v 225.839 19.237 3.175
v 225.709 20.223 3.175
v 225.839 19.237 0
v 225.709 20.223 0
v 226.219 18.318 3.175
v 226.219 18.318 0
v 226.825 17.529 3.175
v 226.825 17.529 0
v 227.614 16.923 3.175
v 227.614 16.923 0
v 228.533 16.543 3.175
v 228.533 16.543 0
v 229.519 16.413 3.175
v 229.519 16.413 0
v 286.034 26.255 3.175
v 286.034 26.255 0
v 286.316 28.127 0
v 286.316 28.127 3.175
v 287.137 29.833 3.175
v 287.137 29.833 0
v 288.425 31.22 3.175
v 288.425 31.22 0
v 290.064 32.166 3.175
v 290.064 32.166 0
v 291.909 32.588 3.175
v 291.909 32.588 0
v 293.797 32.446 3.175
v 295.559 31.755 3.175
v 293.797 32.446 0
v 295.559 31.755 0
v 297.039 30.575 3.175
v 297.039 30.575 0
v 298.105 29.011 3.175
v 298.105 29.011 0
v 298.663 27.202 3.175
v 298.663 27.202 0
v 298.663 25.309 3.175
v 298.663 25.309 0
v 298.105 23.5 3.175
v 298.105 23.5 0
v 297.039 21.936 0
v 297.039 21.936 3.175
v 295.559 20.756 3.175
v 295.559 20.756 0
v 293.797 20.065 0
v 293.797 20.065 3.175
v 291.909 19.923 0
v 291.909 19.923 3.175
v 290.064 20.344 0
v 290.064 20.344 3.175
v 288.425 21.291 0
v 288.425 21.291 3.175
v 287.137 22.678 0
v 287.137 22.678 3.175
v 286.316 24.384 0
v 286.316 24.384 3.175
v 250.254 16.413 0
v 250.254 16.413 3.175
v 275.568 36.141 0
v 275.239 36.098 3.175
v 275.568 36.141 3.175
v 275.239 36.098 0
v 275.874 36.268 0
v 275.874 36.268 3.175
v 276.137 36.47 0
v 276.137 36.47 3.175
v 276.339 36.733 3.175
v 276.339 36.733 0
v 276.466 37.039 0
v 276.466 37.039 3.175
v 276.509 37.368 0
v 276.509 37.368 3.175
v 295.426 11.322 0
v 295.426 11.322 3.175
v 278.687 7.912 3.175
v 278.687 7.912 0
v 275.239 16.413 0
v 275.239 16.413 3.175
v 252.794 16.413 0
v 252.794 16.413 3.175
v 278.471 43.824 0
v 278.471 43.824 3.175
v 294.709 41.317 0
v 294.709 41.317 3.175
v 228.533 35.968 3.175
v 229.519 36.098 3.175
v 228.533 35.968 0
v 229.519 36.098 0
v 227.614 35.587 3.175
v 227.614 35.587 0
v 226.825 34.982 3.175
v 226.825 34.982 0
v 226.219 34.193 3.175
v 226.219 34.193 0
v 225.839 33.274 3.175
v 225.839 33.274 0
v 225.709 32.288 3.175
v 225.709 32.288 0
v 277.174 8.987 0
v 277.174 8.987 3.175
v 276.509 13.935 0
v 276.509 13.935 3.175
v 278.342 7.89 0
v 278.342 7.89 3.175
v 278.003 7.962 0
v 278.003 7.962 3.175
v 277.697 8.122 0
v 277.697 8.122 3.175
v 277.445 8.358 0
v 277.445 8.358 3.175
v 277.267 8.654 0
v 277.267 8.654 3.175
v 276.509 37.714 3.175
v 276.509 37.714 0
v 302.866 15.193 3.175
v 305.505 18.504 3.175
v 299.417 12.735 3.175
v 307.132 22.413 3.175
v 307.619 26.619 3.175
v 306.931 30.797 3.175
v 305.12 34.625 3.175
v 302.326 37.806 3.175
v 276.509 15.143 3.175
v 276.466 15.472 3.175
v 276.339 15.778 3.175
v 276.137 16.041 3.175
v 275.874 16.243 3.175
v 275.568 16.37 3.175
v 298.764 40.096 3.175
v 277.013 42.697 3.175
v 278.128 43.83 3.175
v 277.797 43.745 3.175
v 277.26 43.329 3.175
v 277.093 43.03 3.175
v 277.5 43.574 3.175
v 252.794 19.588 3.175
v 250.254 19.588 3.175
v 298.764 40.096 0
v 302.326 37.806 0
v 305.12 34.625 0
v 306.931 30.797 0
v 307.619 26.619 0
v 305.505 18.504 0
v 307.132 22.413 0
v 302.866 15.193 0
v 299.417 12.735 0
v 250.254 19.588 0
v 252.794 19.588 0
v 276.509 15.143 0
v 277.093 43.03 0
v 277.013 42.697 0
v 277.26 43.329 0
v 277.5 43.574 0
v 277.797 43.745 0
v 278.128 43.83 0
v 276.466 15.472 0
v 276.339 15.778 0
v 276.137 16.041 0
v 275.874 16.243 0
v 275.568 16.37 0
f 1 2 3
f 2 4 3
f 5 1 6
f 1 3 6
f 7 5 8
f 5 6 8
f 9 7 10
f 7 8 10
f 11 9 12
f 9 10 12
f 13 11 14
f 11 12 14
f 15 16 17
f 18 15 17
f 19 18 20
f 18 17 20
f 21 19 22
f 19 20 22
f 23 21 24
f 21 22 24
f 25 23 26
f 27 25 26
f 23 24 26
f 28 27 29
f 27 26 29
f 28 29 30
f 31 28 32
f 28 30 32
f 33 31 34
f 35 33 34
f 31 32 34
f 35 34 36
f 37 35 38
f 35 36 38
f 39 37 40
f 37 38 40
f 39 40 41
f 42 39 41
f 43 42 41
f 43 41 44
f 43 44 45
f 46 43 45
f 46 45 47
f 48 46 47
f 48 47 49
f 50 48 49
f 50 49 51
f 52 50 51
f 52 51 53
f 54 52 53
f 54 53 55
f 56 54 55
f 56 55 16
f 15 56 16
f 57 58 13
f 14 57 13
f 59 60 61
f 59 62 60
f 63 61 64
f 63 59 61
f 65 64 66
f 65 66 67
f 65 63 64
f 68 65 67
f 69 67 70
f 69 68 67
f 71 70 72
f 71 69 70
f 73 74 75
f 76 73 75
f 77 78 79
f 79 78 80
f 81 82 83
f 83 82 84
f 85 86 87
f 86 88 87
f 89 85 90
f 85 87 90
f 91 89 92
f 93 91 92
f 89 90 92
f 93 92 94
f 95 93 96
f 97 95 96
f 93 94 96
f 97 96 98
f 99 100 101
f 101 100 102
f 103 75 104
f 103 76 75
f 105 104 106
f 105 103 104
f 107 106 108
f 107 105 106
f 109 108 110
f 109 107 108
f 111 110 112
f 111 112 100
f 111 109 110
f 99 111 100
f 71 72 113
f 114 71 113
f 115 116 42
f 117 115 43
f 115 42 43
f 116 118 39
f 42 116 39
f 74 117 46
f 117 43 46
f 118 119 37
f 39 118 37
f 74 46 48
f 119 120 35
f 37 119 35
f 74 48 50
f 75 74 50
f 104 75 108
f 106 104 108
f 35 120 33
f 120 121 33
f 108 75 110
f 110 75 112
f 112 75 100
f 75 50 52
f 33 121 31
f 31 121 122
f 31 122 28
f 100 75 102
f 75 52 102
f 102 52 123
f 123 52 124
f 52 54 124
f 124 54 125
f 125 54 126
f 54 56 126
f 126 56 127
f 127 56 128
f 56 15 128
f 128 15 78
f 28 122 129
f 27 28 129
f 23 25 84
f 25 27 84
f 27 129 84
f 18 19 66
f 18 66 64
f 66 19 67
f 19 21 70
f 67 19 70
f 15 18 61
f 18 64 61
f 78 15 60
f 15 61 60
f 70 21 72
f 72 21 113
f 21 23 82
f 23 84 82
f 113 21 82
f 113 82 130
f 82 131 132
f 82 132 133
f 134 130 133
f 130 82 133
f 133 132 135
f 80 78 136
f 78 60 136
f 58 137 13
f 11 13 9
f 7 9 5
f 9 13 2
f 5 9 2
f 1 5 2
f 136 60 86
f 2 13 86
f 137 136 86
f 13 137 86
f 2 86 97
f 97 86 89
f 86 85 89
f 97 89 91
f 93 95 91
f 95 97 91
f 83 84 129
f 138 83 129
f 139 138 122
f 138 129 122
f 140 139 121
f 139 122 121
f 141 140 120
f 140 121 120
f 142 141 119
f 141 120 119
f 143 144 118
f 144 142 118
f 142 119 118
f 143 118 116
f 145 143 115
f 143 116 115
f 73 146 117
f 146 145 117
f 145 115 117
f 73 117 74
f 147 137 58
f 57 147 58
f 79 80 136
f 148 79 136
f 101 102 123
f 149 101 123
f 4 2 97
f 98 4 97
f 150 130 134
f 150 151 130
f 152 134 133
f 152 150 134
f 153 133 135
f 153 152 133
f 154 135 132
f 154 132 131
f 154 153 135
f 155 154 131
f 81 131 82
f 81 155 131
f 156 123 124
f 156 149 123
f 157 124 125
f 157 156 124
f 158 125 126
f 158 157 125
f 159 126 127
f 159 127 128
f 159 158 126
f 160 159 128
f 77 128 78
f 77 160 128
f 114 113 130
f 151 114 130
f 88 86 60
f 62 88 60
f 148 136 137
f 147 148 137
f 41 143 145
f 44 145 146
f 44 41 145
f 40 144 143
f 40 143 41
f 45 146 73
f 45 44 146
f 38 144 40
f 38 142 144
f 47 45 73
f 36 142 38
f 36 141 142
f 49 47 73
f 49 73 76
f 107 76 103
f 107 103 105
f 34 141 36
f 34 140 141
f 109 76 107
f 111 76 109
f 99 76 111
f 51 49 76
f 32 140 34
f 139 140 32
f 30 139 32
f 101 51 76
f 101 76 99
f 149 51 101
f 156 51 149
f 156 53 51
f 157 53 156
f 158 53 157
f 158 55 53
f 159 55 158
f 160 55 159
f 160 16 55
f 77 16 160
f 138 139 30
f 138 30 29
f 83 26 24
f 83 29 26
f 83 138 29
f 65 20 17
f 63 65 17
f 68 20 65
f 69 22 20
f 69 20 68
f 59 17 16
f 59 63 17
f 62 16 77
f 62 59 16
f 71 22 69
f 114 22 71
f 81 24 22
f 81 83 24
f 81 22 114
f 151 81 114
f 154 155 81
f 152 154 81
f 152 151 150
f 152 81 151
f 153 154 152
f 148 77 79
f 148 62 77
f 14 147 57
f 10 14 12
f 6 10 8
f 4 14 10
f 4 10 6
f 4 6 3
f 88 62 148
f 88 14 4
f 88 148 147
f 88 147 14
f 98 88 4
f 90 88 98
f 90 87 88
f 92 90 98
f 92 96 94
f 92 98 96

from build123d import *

# Parameters (mm, degrees)
BOSS_EXTRUDE1_DEPTH = 3.175
CUT_EXTRUDE1_DEPTH  = 7.62
SKETCH3_R           = 6.35
CUT_EXTRUDE2_DEPTH  = 7.62
CUT_EXTRUDE3_DEPTH  = 443.627115857
FILLET1_R           = 3.81
FILLET2_R           = 1.27


with BuildPart() as part:
    # Sketch1 → Boss-Extrude1 (new body)
    with BuildSketch(Plane.XY):
        with BuildLine():
            Line((435.33010469, 0.678691456), (439.172882547, -1.614212492))
            Line((439.172882547, -1.614212492), (434.787151486, -0.678691456))
            add(Edge.make_bspline(
                [(0, 0), (0.11179123, -0.527729161), (0.335887463, -1.58561283), (0.94472768, -3.108527015), (1.749889805, -4.572488672), (2.768272335, -5.973609192), (3.993104005, -7.311505618), (5.421679636, -8.587569541), (7.052598221, -9.801114861), (8.883725224, -10.951589231), (10.912400596, -12.040213999), (13.136344152, -13.066312264), (15.553528081, -14.029563428), (18.161318821, -14.928679795), (20.956528242, -15.765030781), (23.936498821, -16.536578215), (27.097842034, -17.244400464), (30.437517266, -17.886690773), (33.951885298, -18.464101669), (37.637295209, -18.976309975), (41.489964184, -19.423636044), (45.506112459, -19.80514129), (49.681767661, -20.121646285), (54.012767863, -20.373360955), (58.494909036, -20.561083494), (63.123897762, -20.684100336), (67.895200479, -20.744329207), (72.804505265, -20.742674403), (77.847009648, -20.678693244), (83.018406129, -20.555920262), (88.313732191, -20.373577887), (93.728207214, -20.133872554), (99.256947275, -19.839216685), (104.89499369, -19.49060908), (110.637384794, -19.089594814), (116.479134607, -18.639389777), (122.414936441, -18.141116951), (128.439613477, -17.597680601), (134.547832047, -17.011801372), (140.734314746, -16.385333349), (146.993600903, -15.721223571), (153.320115485, -15.021624036), (159.708476563, -14.290267097), (166.152848405, -13.528475979), (172.647781594, -12.740600204), (179.187166024, -11.928145018), (185.765533466, -11.094239816), (192.376967293, -10.242811017), (199.015278084, -9.37376151), (205.674882543, -8.493282903), (212.349358377, -7.600650086), (219.032895906, -6.7004538), (225.719308248, -5.795492203), (232.402082768, -4.886043807), (239.075345122, -3.975877517), (245.732904616, -3.06749205), (252.368240069, -2.160970285), (258.975348295, -1.26081803), (265.547576185, -0.366925322), (272.078863439, 0.518895586), (278.562951189, 1.394000598), (284.993721977, 2.257285217), (291.364542133, 3.108203268), (297.66900214, 3.947074317), (303.806375969, 4.748436439), (309.760626579, 5.554962658), (315.551818652, 6.216135275), (321.27090305, 6.780469964), (326.923820465, 7.243146515), (332.503782957, 7.610821489), (338.004397185, 7.886122043), (343.419107553, 8.072891719), (348.74107448, 8.176671364), (353.963650696, 8.200094537), (359.079707468, 8.150631139), (364.082590991, 8.032268225), (368.965318868, 7.850318702), (373.721079318, 7.610921079), (378.343117125, 7.320601554), (382.824493294, 6.983642622), (387.158963185, 6.607910686), (391.339839301, 6.198906082), (395.360701925, 5.761301701), (399.215684034, 5.304267166), (402.898615263, 4.830811549), (406.403955911, 4.348715399), (409.726063296, 3.862864382), (412.859676284, 3.379461168), (415.799871302, 2.903117573), (418.541899149, 2.440155772), (421.081464376, 1.994901374), (423.414160264, 1.571702591), (425.536750687, 1.175899009), (427.445043551, 0.809456817), (429.136486586, 0.478415007), (430.607934716, 0.184234372), (431.857230885, -0.068940506), (432.88219343, -0.280110359), (433.681265576, -0.445808771), (434.252869013, -0.566300363), (434.596385478, -0.637999126), (434.749014267, -0.670556399), (434.787151486, -0.678691456)],
                knots=[0, 0, 0, 0, 0.003638255, 0.007293231, 0.011028136, 0.014901081, 0.018963272, 0.023258475, 0.027820626, 0.032679082, 0.03785316, 0.043361875, 0.049214679, 0.055422346, 0.061988786, 0.068918036, 0.076211157, 0.083868392, 0.091887411, 0.100265912, 0.108999867, 0.118084529, 0.127514843, 0.13728527, 0.147387917, 0.157816481, 0.168563473, 0.179619128, 0.190977373, 0.202626974, 0.214560478, 0.226767249, 0.239236417, 0.251959004, 0.264923894, 0.278119703, 0.291536035, 0.30516028, 0.318980685, 0.332985499, 0.34716279, 0.361498603, 0.375980747, 0.390597192, 0.405332593, 0.420174823, 0.435109533, 0.450124276, 0.465203068, 0.480333154, 0.495500583, 0.510689775, 0.525887334, 0.541078314, 0.556247233, 0.571381785, 0.58646604, 0.601484515, 0.616424329, 0.631269423, 0.646006524, 0.660620684, 0.675098187, 0.689422858, 0.703581825, 0.716907563, 0.730009274, 0.742952128, 0.755725557, 0.768319951, 0.780724337, 0.792926528, 0.804916041, 0.816679084, 0.828203525, 0.8394749, 0.850481359, 0.861207697, 0.871639326, 0.881763414, 0.891563605, 0.901027365, 0.910138977, 0.918883977, 0.927249278, 0.935221104, 0.942784739, 0.949928188, 0.956638465, 0.962904203, 0.968712288, 0.974054485, 0.978918432, 0.983297219, 0.987180246, 0.990560674, 0.993433357, 0.995790626, 0.997629588, 0.998945816, 0.999736592, 1, 1, 1, 1], degree=3))
            add(Edge.make_bspline(
                [(435.33010469, 0.678691456), (435.296755582, 0.699293055), (435.163488681, 0.781619431), (434.863214309, 0.965803828), (434.363194901, 1.272571896), (433.663211466, 1.69979322), (432.763807452, 2.246333125), (431.664530435, 2.908364558), (430.366066728, 3.683736897), (428.86873043, 4.568782589), (427.172675107, 5.559358025), (425.278546429, 6.651449737), (423.186509465, 7.838875427), (420.897374442, 9.116782681), (418.411926851, 10.4790944), (415.730636684, 11.919657082), (412.854464224, 13.43114364), (409.784513475, 15.00705265), (406.521344218, 16.638681918), (403.066494801, 18.319240705), (399.421116368, 20.040349747), (395.586453278, 21.79282696), (391.56470833, 23.569527811), (387.356993489, 25.359407096), (382.965706604, 27.15470981), (378.392717175, 28.945218407), (373.640732922, 30.722778715), (368.711587102, 32.475875028), (363.608964359, 34.196846251), (358.335340013, 35.87451254), (352.894485425, 37.499762392), (347.289561815, 39.062058655), (341.52524157, 40.553388886), (335.605180365, 41.962892679), (329.534395845, 43.28113527), (323.317713598, 44.500180123), (316.960347344, 45.607856696), (310.479914041, 46.603301327), (303.980682286, 47.431342852), (297.494822244, 48.243461645), (291.0186212, 49.006373108), (284.46326746, 49.736966294), (277.835067652, 50.431127833), (271.140596349, 51.086687253), (264.386630807, 51.700815013), (257.580189535, 52.27171033), (250.727858804, 52.796138155), (243.836864005, 53.273290553), (236.914017847, 53.698972807), (229.966694004, 54.072865307), (223.001944897, 54.392360355), (216.027018499, 54.655256617), (209.049321182, 54.859966995), (202.076096041, 55.004530305), (195.114893299, 55.088037667), (188.172953688, 55.108207309), (181.257823923, 55.064678381), (174.376745271, 54.95595632), (167.537272154, 54.780552763), (160.7466557, 54.538140281), (154.012238926, 54.228824112), (147.341395315, 53.850013849), (140.741361553, 53.404123644), (134.219487317, 52.889280335), (127.782938298, 52.305347044), (121.438460058, 51.65475786), (115.193116172, 50.935743156), (109.053599754, 50.150348891), (103.026626206, 49.300114834), (97.118957953, 48.384577869), (91.33692342, 47.406382542), (85.686763085, 46.366529581), (80.174454785, 45.268067638), (74.805999973, 44.111283189), (69.587081438, 42.899646299), (64.52312301, 41.635267927), (59.619568317, 40.320462769), (54.881388132, 38.958385816), (50.313373811, 37.552127128), (45.920850559, 36.103231966), (41.707138151, 34.617193881), (37.677412709, 33.095067788), (33.834761135, 31.541542875), (30.183686712, 29.958740393), (26.726916941, 28.351485511), (23.468364091, 26.721608068), (20.41035055, 25.073674406), (17.555946308, 23.410211446), (14.907899047, 21.73430892), (12.467321746, 20.050217809), (10.237579271, 18.35899521), (8.219437586, 16.664914738), (6.414173801, 14.97055608), (4.824368385, 13.277086383), (3.449964137, 11.587487839), (2.292762263, 9.903098559), (1.352963468, 8.225512409), (0.632693499, 6.555947979), (0.13123808, 4.895344207), (-0.143255259, 3.246152095), (-0.211578297, 1.607049514), (-0.07042072, 0.534882766), (0, 0)],
                knots=[0, 0, 0, 0, 0.00025409, 0.001015373, 0.002283359, 0.004056577, 0.006330982, 0.009105274, 0.012374489, 0.016134023, 0.02037966, 0.025105976, 0.030306237, 0.035972206, 0.042099522, 0.048678064, 0.055701664, 0.063160184, 0.071045824, 0.079349826, 0.08806291, 0.097175756, 0.106678112, 0.116561573, 0.126814275, 0.137428301, 0.148393618, 0.15969976, 0.171338126, 0.183297699, 0.195569604, 0.208143556, 0.221011593, 0.234161831, 0.24758745, 0.261276822, 0.27522271, 0.289414144, 0.303771199, 0.317689227, 0.331784111, 0.346039677, 0.36044387, 0.37498272, 0.389640454, 0.404403316, 0.419256601, 0.434186749, 0.449177265, 0.464214782, 0.479284009, 0.49436974, 0.509457833, 0.524532346, 0.53957932, 0.554582984, 0.569529546, 0.584403417, 0.599190992, 0.613876838, 0.628447475, 0.642888675, 0.657186054, 0.671325546, 0.685294014, 0.699078147, 0.712665095, 0.726042645, 0.739197713, 0.752117586, 0.764792042, 0.777208152, 0.789355685, 0.80122396, 0.812803686, 0.824082909, 0.835054602, 0.845709571, 0.856037853, 0.866033834, 0.875688843, 0.884997719, 0.893953426, 0.902552897, 0.910789386, 0.918660734, 0.926166253, 0.933302626, 0.94007122, 0.94647478, 0.952517526, 0.958204819, 0.963546652, 0.9685566, 0.973249913, 0.977651041, 0.981787043, 0.985694226, 0.989415109, 0.993001157, 0.996508416, 1, 1, 1, 1], degree=3))
        make_face()
    extrude(amount=BOSS_EXTRUDE1_DEPTH)

    # Sketch2 → Cut-Extrude1 (cut)
    with BuildSketch(Plane(origin=(0, 0, 0), x_dir=(-1, 0, 0), z_dir=(0, 0, -1))):
        Polygon((-252.794440989, 13.221493744), (-250.254440989, 13.221493744), (-250.254440989, -2.115243028), (-250.254440989, -3.986349358), (-252.794440989, -3.050796193), (-252.794440989, -2.115243028), align=None)
        Polygon((-159.131940989, 54.422217902), (-159.131940989, 39.039100326), (-152.781940989, 39.039100326), (-152.781940989, 54.422217902), (-152.781940989, 57.645440557), (-159.131940989, 55.540936844), align=None)
        Polygon((-74.994440989, -5.928775484), (-74.994440989, -20.141805429), (-74.994440989, -20.97642061), (-71.819440989, -22.145862066), (-71.819440989, -20.141805429), (-71.819440989, -5.928775484), align=None)
    extrude(amount=-CUT_EXTRUDE1_DEPTH, mode=Mode.SUBTRACT)

    # Sketch3 → Cut-Extrude2 (cut)
    with BuildSketch(Plane(origin=(0, 0, 0), x_dir=(-1, 0, 0), z_dir=(0, 0, -1))):
        with Locations((-292.383806588, 26.255421435)):
            Circle(SKETCH3_R)
    extrude(amount=-CUT_EXTRUDE2_DEPTH, mode=Mode.SUBTRACT)

    # Sketch4 → Cut-Extrude3 (cut, through all)
    with BuildSketch(Plane.XY.offset(3.175)):
        with BuildLine():
            Line((252.794440989, 13.221493744), (252.794440989, -2.10324862))
            add(Edge.make_bspline(
                [(252.794440989, -2.10324862), (254.858559034, -1.821690299), (259.114187798, -1.241934385), (265.547576185, -0.366925322), (272.078863439, 0.518895586), (278.562951189, 1.394000598), (284.993721977, 2.257285217), (291.364542133, 3.108203268), (297.66900214, 3.947074317), (303.806375969, 4.748436439), (309.760626579, 5.554962658), (315.551818652, 6.216135275), (321.27090305, 6.780469964), (326.923820465, 7.243146515), (332.503782957, 7.610821489), (338.004397185, 7.886122043), (343.419107553, 8.072891719), (348.74107448, 8.176671364), (353.963650696, 8.200094537), (359.079707468, 8.150631139), (364.082590991, 8.032268225), (368.965318868, 7.850318702), (373.721079318, 7.610921079), (378.343117125, 7.320601554), (382.824493294, 6.983642622), (387.158963185, 6.607910686), (391.339839301, 6.198906082), (395.360701925, 5.761301701), (399.215684034, 5.304267166), (402.898615263, 4.830811549), (406.403955911, 4.348715399), (409.726063296, 3.862864382), (412.859676284, 3.379461168), (415.799871302, 2.903117573), (418.541899149, 2.440155772), (421.081464376, 1.994901374), (423.414160264, 1.571702591), (425.536750687, 1.175899009), (427.445043551, 0.809456817), (429.136486586, 0.478415007), (430.607934716, 0.184234372), (431.857230885, -0.068940506), (432.88219343, -0.280110359), (433.681265576, -0.445808771), (434.252869013, -0.566300363), (434.596385478, -0.637999126), (434.749014267, -0.670556399), (434.787151486, -0.678691456)],
                knots=[0.58741252, 0.58741252, 0.58741252, 0.58741252, 0.601484515, 0.616424329, 0.631269423, 0.646006524, 0.660620684, 0.675098187, 0.689422858, 0.703581825, 0.716907563, 0.730009274, 0.742952128, 0.755725557, 0.768319951, 0.780724337, 0.792926528, 0.804916041, 0.816679084, 0.828203525, 0.8394749, 0.850481359, 0.861207697, 0.871639326, 0.881763414, 0.891563605, 0.901027365, 0.910138977, 0.918883977, 0.927249278, 0.935221104, 0.942784739, 0.949928188, 0.956638465, 0.962904203, 0.968712288, 0.974054485, 0.978918432, 0.983297219, 0.987180246, 0.990560674, 0.993433357, 0.995790626, 0.997629588, 0.998945816, 0.999736592, 1, 1, 1, 1], degree=3))
            Line((434.787151486, -0.678691456), (439.172882547, -1.614212492))
            Line((439.172882547, -1.614212492), (435.33010469, 0.678691456))
            add(Edge.make_bspline(
                [(435.33010469, 0.678691456), (435.296755582, 0.699293055), (435.163488681, 0.781619431), (434.863214309, 0.965803828), (434.363194901, 1.272571896), (433.663211466, 1.69979322), (432.763807452, 2.246333125), (431.664530435, 2.908364558), (430.366066728, 3.683736897), (428.86873043, 4.568782589), (427.172675107, 5.559358025), (425.278546429, 6.651449737), (423.186509465, 7.838875427), (420.897374442, 9.116782681), (418.411926851, 10.4790944), (415.730636684, 11.919657082), (412.854464224, 13.43114364), (409.784513475, 15.00705265), (406.521344218, 16.638681918), (403.066494801, 18.319240705), (399.421116368, 20.040349747), (395.586453278, 21.79282696), (391.56470833, 23.569527811), (387.356993489, 25.359407096), (382.965706604, 27.15470981), (378.392717175, 28.945218407), (373.640732922, 30.722778715), (368.711587102, 32.475875028), (363.608964359, 34.196846251), (358.335340013, 35.87451254), (352.894485425, 37.499762392), (347.289561815, 39.062058655), (341.52524157, 40.553388886), (335.605180365, 41.962892679), (329.534395845, 43.28113527), (323.317713598, 44.500180123), (316.960347344, 45.607856696), (310.479914041, 46.603301327), (303.980682286, 47.431342852), (297.494822244, 48.243461645), (291.0186212, 49.006373108), (284.46326746, 49.736966294), (277.835067652, 50.431127833), (271.140596349, 51.086687253), (264.386630807, 51.700815013), (257.580189535, 52.27171033), (250.727858804, 52.796138155), (243.836864005, 53.273290553), (236.914017847, 53.698972807), (229.966694004, 54.072865307), (223.001944897, 54.392360355), (216.027018499, 54.655256617), (209.049321182, 54.859966995), (202.076096041, 55.004530305), (195.114893299, 55.088037667), (188.172953688, 55.108207309), (181.257823923, 55.064678381), (174.376745271, 54.95595632), (167.537272154, 54.780552763), (162.460512229, 54.599321798), (159.664388036, 54.481767761), (159.131940989, 54.458728839)],
                knots=[0, 0, 0, 0, 0.00025409, 0.001015373, 0.002283359, 0.004056577, 0.006330982, 0.009105274, 0.012374489, 0.016134023, 0.02037966, 0.025105976, 0.030306237, 0.035972206, 0.042099522, 0.048678064, 0.055701664, 0.063160184, 0.071045824, 0.079349826, 0.08806291, 0.097175756, 0.106678112, 0.116561573, 0.126814275, 0.137428301, 0.148393618, 0.15969976, 0.171338126, 0.183297699, 0.195569604, 0.208143556, 0.221011593, 0.234161831, 0.24758745, 0.261276822, 0.27522271, 0.289414144, 0.303771199, 0.317689227, 0.331784111, 0.346039677, 0.36044387, 0.37498272, 0.389640454, 0.404403316, 0.419256601, 0.434186749, 0.449177265, 0.464214782, 0.479284009, 0.49436974, 0.509457833, 0.524532346, 0.53957932, 0.554582984, 0.569529546, 0.584403417, 0.599190992, 0.613876838, 0.617331371, 0.617331371, 0.617331371, 0.617331371], degree=3))
            Line((159.131940989, 54.458728839), (159.131940989, 39.039100326))
            Line((159.131940989, 39.039100326), (152.781940989, 39.039100326))
            Line((152.781940989, 39.039100326), (152.781940989, 54.152292604))
            add(Edge.make_bspline(
                [(152.781940989, 54.152292604), (150.960838294, 54.055151294), (146.938096683, 53.822767487), (140.741361553, 53.404123644), (134.219487317, 52.889280335), (127.782938298, 52.305347044), (121.438460058, 51.65475786), (115.193116172, 50.935743156), (109.053599754, 50.150348891), (103.026626206, 49.300114834), (97.118957953, 48.384577869), (91.33692342, 47.406382542), (85.686763085, 46.366529581), (80.174454785, 45.268067638), (74.805999973, 44.111283189), (69.587081438, 42.899646299), (64.52312301, 41.635267927), (59.619568317, 40.320462769), (54.881388132, 38.958385816), (50.313373811, 37.552127128), (45.920850559, 36.103231966), (41.707138151, 34.617193881), (37.677412709, 33.095067788), (33.834761135, 31.541542875), (30.183686712, 29.958740393), (26.726916941, 28.351485511), (23.468364091, 26.721608068), (20.41035055, 25.073674406), (17.555946308, 23.410211446), (14.907899047, 21.73430892), (12.467321746, 20.050217809), (10.237579271, 18.35899521), (8.219437586, 16.664914738), (6.414173801, 14.97055608), (4.824368385, 13.277086383), (3.449964137, 11.587487839), (2.292762263, 9.903098559), (1.352963468, 8.225512409), (0.632693499, 6.555947979), (0.13123808, 4.895344207), (-0.143255259, 3.246152095), (-0.211578297, 1.607049514), (-0.07042072, 0.534882766), (0, 0)],
                knots=[0.631067563, 0.631067563, 0.631067563, 0.631067563, 0.642888675, 0.657186054, 0.671325546, 0.685294014, 0.699078147, 0.712665095, 0.726042645, 0.739197713, 0.752117586, 0.764792042, 0.777208152, 0.789355685, 0.80122396, 0.812803686, 0.824082909, 0.835054602, 0.845709571, 0.856037853, 0.866033834, 0.875688843, 0.884997719, 0.893953426, 0.902552897, 0.910789386, 0.918660734, 0.926166253, 0.933302626, 0.94007122, 0.94647478, 0.952517526, 0.958204819, 0.963546652, 0.9685566, 0.973249913, 0.977651041, 0.981787043, 0.985694226, 0.989415109, 0.993001157, 0.996508416, 1, 1, 1, 1], degree=3))
            add(Edge.make_bspline(
                [(0, 0), (0.11179123, -0.527729161), (0.335887463, -1.58561283), (0.94472768, -3.108527015), (1.749889805, -4.572488672), (2.768272335, -5.973609192), (3.993104005, -7.311505618), (5.421679636, -8.587569541), (7.052598221, -9.801114861), (8.883725224, -10.951589231), (10.912400596, -12.040213999), (13.136344152, -13.066312264), (15.553528081, -14.029563428), (18.161318821, -14.928679795), (20.956528242, -15.765030781), (23.936498821, -16.536578215), (27.097842034, -17.244400464), (30.437517266, -17.886690773), (33.951885298, -18.464101669), (37.637295209, -18.976309975), (41.489964184, -19.423636044), (45.506112459, -19.80514129), (49.681767661, -20.121646285), (54.012767863, -20.373360955), (58.494909036, -20.561083494), (63.123897762, -20.684100336), (67.581814032, -20.740373283), (70.496154942, -20.74305812), (71.819440989, -20.73766124)],
                knots=[0, 0, 0, 0, 0.003638255, 0.007293231, 0.011028136, 0.014901081, 0.018963272, 0.023258475, 0.027820626, 0.032679082, 0.03785316, 0.043361875, 0.049214679, 0.055422346, 0.061988786, 0.068918036, 0.076211157, 0.083868392, 0.091887411, 0.100265912, 0.108999867, 0.118084529, 0.127514843, 0.13728527, 0.147387917, 0.157816481, 0.168563473, 0.177502133, 0.177502133, 0.177502133, 0.177502133], degree=3))
            Line((71.819440989, -20.73766124), (71.819440989, -5.928775484))
            Line((71.819440989, -5.928775484), (74.994440989, -5.928775484))
            Line((74.994440989, -5.928775484), (74.994440989, -20.712271676))
            add(Edge.make_bspline(
                [(74.994440989, -20.712271676), (75.930905335, -20.70120515), (78.59177595, -20.661011912), (83.018406129, -20.555920262), (88.313732191, -20.373577887), (93.728207214, -20.133872554), (99.256947275, -19.839216685), (104.89499369, -19.49060908), (110.637384794, -19.089594814), (116.479134607, -18.639389777), (122.414936441, -18.141116951), (128.439613477, -17.597680601), (134.547832047, -17.011801372), (140.734314746, -16.385333349), (146.993600903, -15.721223571), (153.320115485, -15.021624036), (159.708476563, -14.290267097), (166.152848405, -13.528475979), (172.647781594, -12.740600204), (179.187166024, -11.928145018), (185.765533466, -11.094239816), (192.376967293, -10.242811017), (199.015278084, -9.37376151), (205.674882543, -8.493282903), (212.349358377, -7.600650086), (219.032895906, -6.7004538), (225.719308248, -5.795492203), (232.402082768, -4.886043807), (239.075345122, -3.975877517), (245.025066378, -3.164072481), (248.749707349, -2.655315536), (250.254440989, -2.449884512)],
                knots=[0.184651258, 0.184651258, 0.184651258, 0.184651258, 0.190977373, 0.202626974, 0.214560478, 0.226767249, 0.239236417, 0.251959004, 0.264923894, 0.278119703, 0.291536035, 0.30516028, 0.318980685, 0.332985499, 0.34716279, 0.361498603, 0.375980747, 0.390597192, 0.405332593, 0.420174823, 0.435109533, 0.450124276, 0.465203068, 0.480333154, 0.495500583, 0.510689775, 0.525887334, 0.541078314, 0.556247233, 0.571381785, 0.581640373, 0.581640373, 0.581640373, 0.581640373], degree=3))
            Line((250.254440989, -2.449884512), (250.254440989, 13.221493744))
            Line((250.254440989, 13.221493744), (252.794440989, 13.221493744))
        make_face()
        with BuildLine():
            Line((276.508806588, 37.713859181), (277.148087148, 44.028344676))
            Line((277.148087148, 44.028344676), (294.709258182, 41.316957707))
            ThreePointArc((294.709258182, 41.316957707), (307.619460539, 26.619356431), (295.425747266, 11.32209639))
            Line((295.425747266, 11.32209639), (277.355482442, 7.64115638))
            Line((277.355482442, 7.64115638), (276.508806588, 13.934637567))
            Line((276.508806588, 13.934637567), (276.508806588, 16.412921435))
            Line((276.508806588, 16.412921435), (252.794440989, 16.412921435))
            Line((252.794440989, 16.412921435), (252.794440989, 19.587921435))
            Line((252.794440989, 19.587921435), (250.254440989, 19.587921435))
            Line((250.254440989, 19.587921435), (250.254440989, 16.412921435))
            Line((250.254440989, 16.412921435), (225.708806588, 16.412921435))
            Line((225.708806588, 16.412921435), (225.708806588, 36.097921435))
            Line((225.708806588, 36.097921435), (276.508806588, 36.097921435))
            Line((276.508806588, 36.097921435), (276.508806588, 37.713859181))
        make_face(mode=Mode.SUBTRACT)
    extrude(amount=-CUT_EXTRUDE3_DEPTH, mode=Mode.SUBTRACT)

    # Fillet1
    fillet1_edges = [part.edges().sort_by_distance(p)[0] for p in [
        (225.708806588, 36.097921435, 1.5875),
        (225.708806588, 16.412921435, 1.5875),
    ]]
    fillet(fillet1_edges, radius=FILLET1_R)

    # Fillet2
    fillet2_edges = [part.edges().sort_by_distance(p)[0] for p in [
        (277.355482442, 7.64115638, 1.5875),
        (277.148087148, 44.028344676, 1.5875),
        (276.508806588, 36.097921435, 1.5875),
        (276.508806588, 16.412921435, 1.5875),
    ]]
    fillet(fillet2_edges, radius=FILLET2_R)


solid = part.part
